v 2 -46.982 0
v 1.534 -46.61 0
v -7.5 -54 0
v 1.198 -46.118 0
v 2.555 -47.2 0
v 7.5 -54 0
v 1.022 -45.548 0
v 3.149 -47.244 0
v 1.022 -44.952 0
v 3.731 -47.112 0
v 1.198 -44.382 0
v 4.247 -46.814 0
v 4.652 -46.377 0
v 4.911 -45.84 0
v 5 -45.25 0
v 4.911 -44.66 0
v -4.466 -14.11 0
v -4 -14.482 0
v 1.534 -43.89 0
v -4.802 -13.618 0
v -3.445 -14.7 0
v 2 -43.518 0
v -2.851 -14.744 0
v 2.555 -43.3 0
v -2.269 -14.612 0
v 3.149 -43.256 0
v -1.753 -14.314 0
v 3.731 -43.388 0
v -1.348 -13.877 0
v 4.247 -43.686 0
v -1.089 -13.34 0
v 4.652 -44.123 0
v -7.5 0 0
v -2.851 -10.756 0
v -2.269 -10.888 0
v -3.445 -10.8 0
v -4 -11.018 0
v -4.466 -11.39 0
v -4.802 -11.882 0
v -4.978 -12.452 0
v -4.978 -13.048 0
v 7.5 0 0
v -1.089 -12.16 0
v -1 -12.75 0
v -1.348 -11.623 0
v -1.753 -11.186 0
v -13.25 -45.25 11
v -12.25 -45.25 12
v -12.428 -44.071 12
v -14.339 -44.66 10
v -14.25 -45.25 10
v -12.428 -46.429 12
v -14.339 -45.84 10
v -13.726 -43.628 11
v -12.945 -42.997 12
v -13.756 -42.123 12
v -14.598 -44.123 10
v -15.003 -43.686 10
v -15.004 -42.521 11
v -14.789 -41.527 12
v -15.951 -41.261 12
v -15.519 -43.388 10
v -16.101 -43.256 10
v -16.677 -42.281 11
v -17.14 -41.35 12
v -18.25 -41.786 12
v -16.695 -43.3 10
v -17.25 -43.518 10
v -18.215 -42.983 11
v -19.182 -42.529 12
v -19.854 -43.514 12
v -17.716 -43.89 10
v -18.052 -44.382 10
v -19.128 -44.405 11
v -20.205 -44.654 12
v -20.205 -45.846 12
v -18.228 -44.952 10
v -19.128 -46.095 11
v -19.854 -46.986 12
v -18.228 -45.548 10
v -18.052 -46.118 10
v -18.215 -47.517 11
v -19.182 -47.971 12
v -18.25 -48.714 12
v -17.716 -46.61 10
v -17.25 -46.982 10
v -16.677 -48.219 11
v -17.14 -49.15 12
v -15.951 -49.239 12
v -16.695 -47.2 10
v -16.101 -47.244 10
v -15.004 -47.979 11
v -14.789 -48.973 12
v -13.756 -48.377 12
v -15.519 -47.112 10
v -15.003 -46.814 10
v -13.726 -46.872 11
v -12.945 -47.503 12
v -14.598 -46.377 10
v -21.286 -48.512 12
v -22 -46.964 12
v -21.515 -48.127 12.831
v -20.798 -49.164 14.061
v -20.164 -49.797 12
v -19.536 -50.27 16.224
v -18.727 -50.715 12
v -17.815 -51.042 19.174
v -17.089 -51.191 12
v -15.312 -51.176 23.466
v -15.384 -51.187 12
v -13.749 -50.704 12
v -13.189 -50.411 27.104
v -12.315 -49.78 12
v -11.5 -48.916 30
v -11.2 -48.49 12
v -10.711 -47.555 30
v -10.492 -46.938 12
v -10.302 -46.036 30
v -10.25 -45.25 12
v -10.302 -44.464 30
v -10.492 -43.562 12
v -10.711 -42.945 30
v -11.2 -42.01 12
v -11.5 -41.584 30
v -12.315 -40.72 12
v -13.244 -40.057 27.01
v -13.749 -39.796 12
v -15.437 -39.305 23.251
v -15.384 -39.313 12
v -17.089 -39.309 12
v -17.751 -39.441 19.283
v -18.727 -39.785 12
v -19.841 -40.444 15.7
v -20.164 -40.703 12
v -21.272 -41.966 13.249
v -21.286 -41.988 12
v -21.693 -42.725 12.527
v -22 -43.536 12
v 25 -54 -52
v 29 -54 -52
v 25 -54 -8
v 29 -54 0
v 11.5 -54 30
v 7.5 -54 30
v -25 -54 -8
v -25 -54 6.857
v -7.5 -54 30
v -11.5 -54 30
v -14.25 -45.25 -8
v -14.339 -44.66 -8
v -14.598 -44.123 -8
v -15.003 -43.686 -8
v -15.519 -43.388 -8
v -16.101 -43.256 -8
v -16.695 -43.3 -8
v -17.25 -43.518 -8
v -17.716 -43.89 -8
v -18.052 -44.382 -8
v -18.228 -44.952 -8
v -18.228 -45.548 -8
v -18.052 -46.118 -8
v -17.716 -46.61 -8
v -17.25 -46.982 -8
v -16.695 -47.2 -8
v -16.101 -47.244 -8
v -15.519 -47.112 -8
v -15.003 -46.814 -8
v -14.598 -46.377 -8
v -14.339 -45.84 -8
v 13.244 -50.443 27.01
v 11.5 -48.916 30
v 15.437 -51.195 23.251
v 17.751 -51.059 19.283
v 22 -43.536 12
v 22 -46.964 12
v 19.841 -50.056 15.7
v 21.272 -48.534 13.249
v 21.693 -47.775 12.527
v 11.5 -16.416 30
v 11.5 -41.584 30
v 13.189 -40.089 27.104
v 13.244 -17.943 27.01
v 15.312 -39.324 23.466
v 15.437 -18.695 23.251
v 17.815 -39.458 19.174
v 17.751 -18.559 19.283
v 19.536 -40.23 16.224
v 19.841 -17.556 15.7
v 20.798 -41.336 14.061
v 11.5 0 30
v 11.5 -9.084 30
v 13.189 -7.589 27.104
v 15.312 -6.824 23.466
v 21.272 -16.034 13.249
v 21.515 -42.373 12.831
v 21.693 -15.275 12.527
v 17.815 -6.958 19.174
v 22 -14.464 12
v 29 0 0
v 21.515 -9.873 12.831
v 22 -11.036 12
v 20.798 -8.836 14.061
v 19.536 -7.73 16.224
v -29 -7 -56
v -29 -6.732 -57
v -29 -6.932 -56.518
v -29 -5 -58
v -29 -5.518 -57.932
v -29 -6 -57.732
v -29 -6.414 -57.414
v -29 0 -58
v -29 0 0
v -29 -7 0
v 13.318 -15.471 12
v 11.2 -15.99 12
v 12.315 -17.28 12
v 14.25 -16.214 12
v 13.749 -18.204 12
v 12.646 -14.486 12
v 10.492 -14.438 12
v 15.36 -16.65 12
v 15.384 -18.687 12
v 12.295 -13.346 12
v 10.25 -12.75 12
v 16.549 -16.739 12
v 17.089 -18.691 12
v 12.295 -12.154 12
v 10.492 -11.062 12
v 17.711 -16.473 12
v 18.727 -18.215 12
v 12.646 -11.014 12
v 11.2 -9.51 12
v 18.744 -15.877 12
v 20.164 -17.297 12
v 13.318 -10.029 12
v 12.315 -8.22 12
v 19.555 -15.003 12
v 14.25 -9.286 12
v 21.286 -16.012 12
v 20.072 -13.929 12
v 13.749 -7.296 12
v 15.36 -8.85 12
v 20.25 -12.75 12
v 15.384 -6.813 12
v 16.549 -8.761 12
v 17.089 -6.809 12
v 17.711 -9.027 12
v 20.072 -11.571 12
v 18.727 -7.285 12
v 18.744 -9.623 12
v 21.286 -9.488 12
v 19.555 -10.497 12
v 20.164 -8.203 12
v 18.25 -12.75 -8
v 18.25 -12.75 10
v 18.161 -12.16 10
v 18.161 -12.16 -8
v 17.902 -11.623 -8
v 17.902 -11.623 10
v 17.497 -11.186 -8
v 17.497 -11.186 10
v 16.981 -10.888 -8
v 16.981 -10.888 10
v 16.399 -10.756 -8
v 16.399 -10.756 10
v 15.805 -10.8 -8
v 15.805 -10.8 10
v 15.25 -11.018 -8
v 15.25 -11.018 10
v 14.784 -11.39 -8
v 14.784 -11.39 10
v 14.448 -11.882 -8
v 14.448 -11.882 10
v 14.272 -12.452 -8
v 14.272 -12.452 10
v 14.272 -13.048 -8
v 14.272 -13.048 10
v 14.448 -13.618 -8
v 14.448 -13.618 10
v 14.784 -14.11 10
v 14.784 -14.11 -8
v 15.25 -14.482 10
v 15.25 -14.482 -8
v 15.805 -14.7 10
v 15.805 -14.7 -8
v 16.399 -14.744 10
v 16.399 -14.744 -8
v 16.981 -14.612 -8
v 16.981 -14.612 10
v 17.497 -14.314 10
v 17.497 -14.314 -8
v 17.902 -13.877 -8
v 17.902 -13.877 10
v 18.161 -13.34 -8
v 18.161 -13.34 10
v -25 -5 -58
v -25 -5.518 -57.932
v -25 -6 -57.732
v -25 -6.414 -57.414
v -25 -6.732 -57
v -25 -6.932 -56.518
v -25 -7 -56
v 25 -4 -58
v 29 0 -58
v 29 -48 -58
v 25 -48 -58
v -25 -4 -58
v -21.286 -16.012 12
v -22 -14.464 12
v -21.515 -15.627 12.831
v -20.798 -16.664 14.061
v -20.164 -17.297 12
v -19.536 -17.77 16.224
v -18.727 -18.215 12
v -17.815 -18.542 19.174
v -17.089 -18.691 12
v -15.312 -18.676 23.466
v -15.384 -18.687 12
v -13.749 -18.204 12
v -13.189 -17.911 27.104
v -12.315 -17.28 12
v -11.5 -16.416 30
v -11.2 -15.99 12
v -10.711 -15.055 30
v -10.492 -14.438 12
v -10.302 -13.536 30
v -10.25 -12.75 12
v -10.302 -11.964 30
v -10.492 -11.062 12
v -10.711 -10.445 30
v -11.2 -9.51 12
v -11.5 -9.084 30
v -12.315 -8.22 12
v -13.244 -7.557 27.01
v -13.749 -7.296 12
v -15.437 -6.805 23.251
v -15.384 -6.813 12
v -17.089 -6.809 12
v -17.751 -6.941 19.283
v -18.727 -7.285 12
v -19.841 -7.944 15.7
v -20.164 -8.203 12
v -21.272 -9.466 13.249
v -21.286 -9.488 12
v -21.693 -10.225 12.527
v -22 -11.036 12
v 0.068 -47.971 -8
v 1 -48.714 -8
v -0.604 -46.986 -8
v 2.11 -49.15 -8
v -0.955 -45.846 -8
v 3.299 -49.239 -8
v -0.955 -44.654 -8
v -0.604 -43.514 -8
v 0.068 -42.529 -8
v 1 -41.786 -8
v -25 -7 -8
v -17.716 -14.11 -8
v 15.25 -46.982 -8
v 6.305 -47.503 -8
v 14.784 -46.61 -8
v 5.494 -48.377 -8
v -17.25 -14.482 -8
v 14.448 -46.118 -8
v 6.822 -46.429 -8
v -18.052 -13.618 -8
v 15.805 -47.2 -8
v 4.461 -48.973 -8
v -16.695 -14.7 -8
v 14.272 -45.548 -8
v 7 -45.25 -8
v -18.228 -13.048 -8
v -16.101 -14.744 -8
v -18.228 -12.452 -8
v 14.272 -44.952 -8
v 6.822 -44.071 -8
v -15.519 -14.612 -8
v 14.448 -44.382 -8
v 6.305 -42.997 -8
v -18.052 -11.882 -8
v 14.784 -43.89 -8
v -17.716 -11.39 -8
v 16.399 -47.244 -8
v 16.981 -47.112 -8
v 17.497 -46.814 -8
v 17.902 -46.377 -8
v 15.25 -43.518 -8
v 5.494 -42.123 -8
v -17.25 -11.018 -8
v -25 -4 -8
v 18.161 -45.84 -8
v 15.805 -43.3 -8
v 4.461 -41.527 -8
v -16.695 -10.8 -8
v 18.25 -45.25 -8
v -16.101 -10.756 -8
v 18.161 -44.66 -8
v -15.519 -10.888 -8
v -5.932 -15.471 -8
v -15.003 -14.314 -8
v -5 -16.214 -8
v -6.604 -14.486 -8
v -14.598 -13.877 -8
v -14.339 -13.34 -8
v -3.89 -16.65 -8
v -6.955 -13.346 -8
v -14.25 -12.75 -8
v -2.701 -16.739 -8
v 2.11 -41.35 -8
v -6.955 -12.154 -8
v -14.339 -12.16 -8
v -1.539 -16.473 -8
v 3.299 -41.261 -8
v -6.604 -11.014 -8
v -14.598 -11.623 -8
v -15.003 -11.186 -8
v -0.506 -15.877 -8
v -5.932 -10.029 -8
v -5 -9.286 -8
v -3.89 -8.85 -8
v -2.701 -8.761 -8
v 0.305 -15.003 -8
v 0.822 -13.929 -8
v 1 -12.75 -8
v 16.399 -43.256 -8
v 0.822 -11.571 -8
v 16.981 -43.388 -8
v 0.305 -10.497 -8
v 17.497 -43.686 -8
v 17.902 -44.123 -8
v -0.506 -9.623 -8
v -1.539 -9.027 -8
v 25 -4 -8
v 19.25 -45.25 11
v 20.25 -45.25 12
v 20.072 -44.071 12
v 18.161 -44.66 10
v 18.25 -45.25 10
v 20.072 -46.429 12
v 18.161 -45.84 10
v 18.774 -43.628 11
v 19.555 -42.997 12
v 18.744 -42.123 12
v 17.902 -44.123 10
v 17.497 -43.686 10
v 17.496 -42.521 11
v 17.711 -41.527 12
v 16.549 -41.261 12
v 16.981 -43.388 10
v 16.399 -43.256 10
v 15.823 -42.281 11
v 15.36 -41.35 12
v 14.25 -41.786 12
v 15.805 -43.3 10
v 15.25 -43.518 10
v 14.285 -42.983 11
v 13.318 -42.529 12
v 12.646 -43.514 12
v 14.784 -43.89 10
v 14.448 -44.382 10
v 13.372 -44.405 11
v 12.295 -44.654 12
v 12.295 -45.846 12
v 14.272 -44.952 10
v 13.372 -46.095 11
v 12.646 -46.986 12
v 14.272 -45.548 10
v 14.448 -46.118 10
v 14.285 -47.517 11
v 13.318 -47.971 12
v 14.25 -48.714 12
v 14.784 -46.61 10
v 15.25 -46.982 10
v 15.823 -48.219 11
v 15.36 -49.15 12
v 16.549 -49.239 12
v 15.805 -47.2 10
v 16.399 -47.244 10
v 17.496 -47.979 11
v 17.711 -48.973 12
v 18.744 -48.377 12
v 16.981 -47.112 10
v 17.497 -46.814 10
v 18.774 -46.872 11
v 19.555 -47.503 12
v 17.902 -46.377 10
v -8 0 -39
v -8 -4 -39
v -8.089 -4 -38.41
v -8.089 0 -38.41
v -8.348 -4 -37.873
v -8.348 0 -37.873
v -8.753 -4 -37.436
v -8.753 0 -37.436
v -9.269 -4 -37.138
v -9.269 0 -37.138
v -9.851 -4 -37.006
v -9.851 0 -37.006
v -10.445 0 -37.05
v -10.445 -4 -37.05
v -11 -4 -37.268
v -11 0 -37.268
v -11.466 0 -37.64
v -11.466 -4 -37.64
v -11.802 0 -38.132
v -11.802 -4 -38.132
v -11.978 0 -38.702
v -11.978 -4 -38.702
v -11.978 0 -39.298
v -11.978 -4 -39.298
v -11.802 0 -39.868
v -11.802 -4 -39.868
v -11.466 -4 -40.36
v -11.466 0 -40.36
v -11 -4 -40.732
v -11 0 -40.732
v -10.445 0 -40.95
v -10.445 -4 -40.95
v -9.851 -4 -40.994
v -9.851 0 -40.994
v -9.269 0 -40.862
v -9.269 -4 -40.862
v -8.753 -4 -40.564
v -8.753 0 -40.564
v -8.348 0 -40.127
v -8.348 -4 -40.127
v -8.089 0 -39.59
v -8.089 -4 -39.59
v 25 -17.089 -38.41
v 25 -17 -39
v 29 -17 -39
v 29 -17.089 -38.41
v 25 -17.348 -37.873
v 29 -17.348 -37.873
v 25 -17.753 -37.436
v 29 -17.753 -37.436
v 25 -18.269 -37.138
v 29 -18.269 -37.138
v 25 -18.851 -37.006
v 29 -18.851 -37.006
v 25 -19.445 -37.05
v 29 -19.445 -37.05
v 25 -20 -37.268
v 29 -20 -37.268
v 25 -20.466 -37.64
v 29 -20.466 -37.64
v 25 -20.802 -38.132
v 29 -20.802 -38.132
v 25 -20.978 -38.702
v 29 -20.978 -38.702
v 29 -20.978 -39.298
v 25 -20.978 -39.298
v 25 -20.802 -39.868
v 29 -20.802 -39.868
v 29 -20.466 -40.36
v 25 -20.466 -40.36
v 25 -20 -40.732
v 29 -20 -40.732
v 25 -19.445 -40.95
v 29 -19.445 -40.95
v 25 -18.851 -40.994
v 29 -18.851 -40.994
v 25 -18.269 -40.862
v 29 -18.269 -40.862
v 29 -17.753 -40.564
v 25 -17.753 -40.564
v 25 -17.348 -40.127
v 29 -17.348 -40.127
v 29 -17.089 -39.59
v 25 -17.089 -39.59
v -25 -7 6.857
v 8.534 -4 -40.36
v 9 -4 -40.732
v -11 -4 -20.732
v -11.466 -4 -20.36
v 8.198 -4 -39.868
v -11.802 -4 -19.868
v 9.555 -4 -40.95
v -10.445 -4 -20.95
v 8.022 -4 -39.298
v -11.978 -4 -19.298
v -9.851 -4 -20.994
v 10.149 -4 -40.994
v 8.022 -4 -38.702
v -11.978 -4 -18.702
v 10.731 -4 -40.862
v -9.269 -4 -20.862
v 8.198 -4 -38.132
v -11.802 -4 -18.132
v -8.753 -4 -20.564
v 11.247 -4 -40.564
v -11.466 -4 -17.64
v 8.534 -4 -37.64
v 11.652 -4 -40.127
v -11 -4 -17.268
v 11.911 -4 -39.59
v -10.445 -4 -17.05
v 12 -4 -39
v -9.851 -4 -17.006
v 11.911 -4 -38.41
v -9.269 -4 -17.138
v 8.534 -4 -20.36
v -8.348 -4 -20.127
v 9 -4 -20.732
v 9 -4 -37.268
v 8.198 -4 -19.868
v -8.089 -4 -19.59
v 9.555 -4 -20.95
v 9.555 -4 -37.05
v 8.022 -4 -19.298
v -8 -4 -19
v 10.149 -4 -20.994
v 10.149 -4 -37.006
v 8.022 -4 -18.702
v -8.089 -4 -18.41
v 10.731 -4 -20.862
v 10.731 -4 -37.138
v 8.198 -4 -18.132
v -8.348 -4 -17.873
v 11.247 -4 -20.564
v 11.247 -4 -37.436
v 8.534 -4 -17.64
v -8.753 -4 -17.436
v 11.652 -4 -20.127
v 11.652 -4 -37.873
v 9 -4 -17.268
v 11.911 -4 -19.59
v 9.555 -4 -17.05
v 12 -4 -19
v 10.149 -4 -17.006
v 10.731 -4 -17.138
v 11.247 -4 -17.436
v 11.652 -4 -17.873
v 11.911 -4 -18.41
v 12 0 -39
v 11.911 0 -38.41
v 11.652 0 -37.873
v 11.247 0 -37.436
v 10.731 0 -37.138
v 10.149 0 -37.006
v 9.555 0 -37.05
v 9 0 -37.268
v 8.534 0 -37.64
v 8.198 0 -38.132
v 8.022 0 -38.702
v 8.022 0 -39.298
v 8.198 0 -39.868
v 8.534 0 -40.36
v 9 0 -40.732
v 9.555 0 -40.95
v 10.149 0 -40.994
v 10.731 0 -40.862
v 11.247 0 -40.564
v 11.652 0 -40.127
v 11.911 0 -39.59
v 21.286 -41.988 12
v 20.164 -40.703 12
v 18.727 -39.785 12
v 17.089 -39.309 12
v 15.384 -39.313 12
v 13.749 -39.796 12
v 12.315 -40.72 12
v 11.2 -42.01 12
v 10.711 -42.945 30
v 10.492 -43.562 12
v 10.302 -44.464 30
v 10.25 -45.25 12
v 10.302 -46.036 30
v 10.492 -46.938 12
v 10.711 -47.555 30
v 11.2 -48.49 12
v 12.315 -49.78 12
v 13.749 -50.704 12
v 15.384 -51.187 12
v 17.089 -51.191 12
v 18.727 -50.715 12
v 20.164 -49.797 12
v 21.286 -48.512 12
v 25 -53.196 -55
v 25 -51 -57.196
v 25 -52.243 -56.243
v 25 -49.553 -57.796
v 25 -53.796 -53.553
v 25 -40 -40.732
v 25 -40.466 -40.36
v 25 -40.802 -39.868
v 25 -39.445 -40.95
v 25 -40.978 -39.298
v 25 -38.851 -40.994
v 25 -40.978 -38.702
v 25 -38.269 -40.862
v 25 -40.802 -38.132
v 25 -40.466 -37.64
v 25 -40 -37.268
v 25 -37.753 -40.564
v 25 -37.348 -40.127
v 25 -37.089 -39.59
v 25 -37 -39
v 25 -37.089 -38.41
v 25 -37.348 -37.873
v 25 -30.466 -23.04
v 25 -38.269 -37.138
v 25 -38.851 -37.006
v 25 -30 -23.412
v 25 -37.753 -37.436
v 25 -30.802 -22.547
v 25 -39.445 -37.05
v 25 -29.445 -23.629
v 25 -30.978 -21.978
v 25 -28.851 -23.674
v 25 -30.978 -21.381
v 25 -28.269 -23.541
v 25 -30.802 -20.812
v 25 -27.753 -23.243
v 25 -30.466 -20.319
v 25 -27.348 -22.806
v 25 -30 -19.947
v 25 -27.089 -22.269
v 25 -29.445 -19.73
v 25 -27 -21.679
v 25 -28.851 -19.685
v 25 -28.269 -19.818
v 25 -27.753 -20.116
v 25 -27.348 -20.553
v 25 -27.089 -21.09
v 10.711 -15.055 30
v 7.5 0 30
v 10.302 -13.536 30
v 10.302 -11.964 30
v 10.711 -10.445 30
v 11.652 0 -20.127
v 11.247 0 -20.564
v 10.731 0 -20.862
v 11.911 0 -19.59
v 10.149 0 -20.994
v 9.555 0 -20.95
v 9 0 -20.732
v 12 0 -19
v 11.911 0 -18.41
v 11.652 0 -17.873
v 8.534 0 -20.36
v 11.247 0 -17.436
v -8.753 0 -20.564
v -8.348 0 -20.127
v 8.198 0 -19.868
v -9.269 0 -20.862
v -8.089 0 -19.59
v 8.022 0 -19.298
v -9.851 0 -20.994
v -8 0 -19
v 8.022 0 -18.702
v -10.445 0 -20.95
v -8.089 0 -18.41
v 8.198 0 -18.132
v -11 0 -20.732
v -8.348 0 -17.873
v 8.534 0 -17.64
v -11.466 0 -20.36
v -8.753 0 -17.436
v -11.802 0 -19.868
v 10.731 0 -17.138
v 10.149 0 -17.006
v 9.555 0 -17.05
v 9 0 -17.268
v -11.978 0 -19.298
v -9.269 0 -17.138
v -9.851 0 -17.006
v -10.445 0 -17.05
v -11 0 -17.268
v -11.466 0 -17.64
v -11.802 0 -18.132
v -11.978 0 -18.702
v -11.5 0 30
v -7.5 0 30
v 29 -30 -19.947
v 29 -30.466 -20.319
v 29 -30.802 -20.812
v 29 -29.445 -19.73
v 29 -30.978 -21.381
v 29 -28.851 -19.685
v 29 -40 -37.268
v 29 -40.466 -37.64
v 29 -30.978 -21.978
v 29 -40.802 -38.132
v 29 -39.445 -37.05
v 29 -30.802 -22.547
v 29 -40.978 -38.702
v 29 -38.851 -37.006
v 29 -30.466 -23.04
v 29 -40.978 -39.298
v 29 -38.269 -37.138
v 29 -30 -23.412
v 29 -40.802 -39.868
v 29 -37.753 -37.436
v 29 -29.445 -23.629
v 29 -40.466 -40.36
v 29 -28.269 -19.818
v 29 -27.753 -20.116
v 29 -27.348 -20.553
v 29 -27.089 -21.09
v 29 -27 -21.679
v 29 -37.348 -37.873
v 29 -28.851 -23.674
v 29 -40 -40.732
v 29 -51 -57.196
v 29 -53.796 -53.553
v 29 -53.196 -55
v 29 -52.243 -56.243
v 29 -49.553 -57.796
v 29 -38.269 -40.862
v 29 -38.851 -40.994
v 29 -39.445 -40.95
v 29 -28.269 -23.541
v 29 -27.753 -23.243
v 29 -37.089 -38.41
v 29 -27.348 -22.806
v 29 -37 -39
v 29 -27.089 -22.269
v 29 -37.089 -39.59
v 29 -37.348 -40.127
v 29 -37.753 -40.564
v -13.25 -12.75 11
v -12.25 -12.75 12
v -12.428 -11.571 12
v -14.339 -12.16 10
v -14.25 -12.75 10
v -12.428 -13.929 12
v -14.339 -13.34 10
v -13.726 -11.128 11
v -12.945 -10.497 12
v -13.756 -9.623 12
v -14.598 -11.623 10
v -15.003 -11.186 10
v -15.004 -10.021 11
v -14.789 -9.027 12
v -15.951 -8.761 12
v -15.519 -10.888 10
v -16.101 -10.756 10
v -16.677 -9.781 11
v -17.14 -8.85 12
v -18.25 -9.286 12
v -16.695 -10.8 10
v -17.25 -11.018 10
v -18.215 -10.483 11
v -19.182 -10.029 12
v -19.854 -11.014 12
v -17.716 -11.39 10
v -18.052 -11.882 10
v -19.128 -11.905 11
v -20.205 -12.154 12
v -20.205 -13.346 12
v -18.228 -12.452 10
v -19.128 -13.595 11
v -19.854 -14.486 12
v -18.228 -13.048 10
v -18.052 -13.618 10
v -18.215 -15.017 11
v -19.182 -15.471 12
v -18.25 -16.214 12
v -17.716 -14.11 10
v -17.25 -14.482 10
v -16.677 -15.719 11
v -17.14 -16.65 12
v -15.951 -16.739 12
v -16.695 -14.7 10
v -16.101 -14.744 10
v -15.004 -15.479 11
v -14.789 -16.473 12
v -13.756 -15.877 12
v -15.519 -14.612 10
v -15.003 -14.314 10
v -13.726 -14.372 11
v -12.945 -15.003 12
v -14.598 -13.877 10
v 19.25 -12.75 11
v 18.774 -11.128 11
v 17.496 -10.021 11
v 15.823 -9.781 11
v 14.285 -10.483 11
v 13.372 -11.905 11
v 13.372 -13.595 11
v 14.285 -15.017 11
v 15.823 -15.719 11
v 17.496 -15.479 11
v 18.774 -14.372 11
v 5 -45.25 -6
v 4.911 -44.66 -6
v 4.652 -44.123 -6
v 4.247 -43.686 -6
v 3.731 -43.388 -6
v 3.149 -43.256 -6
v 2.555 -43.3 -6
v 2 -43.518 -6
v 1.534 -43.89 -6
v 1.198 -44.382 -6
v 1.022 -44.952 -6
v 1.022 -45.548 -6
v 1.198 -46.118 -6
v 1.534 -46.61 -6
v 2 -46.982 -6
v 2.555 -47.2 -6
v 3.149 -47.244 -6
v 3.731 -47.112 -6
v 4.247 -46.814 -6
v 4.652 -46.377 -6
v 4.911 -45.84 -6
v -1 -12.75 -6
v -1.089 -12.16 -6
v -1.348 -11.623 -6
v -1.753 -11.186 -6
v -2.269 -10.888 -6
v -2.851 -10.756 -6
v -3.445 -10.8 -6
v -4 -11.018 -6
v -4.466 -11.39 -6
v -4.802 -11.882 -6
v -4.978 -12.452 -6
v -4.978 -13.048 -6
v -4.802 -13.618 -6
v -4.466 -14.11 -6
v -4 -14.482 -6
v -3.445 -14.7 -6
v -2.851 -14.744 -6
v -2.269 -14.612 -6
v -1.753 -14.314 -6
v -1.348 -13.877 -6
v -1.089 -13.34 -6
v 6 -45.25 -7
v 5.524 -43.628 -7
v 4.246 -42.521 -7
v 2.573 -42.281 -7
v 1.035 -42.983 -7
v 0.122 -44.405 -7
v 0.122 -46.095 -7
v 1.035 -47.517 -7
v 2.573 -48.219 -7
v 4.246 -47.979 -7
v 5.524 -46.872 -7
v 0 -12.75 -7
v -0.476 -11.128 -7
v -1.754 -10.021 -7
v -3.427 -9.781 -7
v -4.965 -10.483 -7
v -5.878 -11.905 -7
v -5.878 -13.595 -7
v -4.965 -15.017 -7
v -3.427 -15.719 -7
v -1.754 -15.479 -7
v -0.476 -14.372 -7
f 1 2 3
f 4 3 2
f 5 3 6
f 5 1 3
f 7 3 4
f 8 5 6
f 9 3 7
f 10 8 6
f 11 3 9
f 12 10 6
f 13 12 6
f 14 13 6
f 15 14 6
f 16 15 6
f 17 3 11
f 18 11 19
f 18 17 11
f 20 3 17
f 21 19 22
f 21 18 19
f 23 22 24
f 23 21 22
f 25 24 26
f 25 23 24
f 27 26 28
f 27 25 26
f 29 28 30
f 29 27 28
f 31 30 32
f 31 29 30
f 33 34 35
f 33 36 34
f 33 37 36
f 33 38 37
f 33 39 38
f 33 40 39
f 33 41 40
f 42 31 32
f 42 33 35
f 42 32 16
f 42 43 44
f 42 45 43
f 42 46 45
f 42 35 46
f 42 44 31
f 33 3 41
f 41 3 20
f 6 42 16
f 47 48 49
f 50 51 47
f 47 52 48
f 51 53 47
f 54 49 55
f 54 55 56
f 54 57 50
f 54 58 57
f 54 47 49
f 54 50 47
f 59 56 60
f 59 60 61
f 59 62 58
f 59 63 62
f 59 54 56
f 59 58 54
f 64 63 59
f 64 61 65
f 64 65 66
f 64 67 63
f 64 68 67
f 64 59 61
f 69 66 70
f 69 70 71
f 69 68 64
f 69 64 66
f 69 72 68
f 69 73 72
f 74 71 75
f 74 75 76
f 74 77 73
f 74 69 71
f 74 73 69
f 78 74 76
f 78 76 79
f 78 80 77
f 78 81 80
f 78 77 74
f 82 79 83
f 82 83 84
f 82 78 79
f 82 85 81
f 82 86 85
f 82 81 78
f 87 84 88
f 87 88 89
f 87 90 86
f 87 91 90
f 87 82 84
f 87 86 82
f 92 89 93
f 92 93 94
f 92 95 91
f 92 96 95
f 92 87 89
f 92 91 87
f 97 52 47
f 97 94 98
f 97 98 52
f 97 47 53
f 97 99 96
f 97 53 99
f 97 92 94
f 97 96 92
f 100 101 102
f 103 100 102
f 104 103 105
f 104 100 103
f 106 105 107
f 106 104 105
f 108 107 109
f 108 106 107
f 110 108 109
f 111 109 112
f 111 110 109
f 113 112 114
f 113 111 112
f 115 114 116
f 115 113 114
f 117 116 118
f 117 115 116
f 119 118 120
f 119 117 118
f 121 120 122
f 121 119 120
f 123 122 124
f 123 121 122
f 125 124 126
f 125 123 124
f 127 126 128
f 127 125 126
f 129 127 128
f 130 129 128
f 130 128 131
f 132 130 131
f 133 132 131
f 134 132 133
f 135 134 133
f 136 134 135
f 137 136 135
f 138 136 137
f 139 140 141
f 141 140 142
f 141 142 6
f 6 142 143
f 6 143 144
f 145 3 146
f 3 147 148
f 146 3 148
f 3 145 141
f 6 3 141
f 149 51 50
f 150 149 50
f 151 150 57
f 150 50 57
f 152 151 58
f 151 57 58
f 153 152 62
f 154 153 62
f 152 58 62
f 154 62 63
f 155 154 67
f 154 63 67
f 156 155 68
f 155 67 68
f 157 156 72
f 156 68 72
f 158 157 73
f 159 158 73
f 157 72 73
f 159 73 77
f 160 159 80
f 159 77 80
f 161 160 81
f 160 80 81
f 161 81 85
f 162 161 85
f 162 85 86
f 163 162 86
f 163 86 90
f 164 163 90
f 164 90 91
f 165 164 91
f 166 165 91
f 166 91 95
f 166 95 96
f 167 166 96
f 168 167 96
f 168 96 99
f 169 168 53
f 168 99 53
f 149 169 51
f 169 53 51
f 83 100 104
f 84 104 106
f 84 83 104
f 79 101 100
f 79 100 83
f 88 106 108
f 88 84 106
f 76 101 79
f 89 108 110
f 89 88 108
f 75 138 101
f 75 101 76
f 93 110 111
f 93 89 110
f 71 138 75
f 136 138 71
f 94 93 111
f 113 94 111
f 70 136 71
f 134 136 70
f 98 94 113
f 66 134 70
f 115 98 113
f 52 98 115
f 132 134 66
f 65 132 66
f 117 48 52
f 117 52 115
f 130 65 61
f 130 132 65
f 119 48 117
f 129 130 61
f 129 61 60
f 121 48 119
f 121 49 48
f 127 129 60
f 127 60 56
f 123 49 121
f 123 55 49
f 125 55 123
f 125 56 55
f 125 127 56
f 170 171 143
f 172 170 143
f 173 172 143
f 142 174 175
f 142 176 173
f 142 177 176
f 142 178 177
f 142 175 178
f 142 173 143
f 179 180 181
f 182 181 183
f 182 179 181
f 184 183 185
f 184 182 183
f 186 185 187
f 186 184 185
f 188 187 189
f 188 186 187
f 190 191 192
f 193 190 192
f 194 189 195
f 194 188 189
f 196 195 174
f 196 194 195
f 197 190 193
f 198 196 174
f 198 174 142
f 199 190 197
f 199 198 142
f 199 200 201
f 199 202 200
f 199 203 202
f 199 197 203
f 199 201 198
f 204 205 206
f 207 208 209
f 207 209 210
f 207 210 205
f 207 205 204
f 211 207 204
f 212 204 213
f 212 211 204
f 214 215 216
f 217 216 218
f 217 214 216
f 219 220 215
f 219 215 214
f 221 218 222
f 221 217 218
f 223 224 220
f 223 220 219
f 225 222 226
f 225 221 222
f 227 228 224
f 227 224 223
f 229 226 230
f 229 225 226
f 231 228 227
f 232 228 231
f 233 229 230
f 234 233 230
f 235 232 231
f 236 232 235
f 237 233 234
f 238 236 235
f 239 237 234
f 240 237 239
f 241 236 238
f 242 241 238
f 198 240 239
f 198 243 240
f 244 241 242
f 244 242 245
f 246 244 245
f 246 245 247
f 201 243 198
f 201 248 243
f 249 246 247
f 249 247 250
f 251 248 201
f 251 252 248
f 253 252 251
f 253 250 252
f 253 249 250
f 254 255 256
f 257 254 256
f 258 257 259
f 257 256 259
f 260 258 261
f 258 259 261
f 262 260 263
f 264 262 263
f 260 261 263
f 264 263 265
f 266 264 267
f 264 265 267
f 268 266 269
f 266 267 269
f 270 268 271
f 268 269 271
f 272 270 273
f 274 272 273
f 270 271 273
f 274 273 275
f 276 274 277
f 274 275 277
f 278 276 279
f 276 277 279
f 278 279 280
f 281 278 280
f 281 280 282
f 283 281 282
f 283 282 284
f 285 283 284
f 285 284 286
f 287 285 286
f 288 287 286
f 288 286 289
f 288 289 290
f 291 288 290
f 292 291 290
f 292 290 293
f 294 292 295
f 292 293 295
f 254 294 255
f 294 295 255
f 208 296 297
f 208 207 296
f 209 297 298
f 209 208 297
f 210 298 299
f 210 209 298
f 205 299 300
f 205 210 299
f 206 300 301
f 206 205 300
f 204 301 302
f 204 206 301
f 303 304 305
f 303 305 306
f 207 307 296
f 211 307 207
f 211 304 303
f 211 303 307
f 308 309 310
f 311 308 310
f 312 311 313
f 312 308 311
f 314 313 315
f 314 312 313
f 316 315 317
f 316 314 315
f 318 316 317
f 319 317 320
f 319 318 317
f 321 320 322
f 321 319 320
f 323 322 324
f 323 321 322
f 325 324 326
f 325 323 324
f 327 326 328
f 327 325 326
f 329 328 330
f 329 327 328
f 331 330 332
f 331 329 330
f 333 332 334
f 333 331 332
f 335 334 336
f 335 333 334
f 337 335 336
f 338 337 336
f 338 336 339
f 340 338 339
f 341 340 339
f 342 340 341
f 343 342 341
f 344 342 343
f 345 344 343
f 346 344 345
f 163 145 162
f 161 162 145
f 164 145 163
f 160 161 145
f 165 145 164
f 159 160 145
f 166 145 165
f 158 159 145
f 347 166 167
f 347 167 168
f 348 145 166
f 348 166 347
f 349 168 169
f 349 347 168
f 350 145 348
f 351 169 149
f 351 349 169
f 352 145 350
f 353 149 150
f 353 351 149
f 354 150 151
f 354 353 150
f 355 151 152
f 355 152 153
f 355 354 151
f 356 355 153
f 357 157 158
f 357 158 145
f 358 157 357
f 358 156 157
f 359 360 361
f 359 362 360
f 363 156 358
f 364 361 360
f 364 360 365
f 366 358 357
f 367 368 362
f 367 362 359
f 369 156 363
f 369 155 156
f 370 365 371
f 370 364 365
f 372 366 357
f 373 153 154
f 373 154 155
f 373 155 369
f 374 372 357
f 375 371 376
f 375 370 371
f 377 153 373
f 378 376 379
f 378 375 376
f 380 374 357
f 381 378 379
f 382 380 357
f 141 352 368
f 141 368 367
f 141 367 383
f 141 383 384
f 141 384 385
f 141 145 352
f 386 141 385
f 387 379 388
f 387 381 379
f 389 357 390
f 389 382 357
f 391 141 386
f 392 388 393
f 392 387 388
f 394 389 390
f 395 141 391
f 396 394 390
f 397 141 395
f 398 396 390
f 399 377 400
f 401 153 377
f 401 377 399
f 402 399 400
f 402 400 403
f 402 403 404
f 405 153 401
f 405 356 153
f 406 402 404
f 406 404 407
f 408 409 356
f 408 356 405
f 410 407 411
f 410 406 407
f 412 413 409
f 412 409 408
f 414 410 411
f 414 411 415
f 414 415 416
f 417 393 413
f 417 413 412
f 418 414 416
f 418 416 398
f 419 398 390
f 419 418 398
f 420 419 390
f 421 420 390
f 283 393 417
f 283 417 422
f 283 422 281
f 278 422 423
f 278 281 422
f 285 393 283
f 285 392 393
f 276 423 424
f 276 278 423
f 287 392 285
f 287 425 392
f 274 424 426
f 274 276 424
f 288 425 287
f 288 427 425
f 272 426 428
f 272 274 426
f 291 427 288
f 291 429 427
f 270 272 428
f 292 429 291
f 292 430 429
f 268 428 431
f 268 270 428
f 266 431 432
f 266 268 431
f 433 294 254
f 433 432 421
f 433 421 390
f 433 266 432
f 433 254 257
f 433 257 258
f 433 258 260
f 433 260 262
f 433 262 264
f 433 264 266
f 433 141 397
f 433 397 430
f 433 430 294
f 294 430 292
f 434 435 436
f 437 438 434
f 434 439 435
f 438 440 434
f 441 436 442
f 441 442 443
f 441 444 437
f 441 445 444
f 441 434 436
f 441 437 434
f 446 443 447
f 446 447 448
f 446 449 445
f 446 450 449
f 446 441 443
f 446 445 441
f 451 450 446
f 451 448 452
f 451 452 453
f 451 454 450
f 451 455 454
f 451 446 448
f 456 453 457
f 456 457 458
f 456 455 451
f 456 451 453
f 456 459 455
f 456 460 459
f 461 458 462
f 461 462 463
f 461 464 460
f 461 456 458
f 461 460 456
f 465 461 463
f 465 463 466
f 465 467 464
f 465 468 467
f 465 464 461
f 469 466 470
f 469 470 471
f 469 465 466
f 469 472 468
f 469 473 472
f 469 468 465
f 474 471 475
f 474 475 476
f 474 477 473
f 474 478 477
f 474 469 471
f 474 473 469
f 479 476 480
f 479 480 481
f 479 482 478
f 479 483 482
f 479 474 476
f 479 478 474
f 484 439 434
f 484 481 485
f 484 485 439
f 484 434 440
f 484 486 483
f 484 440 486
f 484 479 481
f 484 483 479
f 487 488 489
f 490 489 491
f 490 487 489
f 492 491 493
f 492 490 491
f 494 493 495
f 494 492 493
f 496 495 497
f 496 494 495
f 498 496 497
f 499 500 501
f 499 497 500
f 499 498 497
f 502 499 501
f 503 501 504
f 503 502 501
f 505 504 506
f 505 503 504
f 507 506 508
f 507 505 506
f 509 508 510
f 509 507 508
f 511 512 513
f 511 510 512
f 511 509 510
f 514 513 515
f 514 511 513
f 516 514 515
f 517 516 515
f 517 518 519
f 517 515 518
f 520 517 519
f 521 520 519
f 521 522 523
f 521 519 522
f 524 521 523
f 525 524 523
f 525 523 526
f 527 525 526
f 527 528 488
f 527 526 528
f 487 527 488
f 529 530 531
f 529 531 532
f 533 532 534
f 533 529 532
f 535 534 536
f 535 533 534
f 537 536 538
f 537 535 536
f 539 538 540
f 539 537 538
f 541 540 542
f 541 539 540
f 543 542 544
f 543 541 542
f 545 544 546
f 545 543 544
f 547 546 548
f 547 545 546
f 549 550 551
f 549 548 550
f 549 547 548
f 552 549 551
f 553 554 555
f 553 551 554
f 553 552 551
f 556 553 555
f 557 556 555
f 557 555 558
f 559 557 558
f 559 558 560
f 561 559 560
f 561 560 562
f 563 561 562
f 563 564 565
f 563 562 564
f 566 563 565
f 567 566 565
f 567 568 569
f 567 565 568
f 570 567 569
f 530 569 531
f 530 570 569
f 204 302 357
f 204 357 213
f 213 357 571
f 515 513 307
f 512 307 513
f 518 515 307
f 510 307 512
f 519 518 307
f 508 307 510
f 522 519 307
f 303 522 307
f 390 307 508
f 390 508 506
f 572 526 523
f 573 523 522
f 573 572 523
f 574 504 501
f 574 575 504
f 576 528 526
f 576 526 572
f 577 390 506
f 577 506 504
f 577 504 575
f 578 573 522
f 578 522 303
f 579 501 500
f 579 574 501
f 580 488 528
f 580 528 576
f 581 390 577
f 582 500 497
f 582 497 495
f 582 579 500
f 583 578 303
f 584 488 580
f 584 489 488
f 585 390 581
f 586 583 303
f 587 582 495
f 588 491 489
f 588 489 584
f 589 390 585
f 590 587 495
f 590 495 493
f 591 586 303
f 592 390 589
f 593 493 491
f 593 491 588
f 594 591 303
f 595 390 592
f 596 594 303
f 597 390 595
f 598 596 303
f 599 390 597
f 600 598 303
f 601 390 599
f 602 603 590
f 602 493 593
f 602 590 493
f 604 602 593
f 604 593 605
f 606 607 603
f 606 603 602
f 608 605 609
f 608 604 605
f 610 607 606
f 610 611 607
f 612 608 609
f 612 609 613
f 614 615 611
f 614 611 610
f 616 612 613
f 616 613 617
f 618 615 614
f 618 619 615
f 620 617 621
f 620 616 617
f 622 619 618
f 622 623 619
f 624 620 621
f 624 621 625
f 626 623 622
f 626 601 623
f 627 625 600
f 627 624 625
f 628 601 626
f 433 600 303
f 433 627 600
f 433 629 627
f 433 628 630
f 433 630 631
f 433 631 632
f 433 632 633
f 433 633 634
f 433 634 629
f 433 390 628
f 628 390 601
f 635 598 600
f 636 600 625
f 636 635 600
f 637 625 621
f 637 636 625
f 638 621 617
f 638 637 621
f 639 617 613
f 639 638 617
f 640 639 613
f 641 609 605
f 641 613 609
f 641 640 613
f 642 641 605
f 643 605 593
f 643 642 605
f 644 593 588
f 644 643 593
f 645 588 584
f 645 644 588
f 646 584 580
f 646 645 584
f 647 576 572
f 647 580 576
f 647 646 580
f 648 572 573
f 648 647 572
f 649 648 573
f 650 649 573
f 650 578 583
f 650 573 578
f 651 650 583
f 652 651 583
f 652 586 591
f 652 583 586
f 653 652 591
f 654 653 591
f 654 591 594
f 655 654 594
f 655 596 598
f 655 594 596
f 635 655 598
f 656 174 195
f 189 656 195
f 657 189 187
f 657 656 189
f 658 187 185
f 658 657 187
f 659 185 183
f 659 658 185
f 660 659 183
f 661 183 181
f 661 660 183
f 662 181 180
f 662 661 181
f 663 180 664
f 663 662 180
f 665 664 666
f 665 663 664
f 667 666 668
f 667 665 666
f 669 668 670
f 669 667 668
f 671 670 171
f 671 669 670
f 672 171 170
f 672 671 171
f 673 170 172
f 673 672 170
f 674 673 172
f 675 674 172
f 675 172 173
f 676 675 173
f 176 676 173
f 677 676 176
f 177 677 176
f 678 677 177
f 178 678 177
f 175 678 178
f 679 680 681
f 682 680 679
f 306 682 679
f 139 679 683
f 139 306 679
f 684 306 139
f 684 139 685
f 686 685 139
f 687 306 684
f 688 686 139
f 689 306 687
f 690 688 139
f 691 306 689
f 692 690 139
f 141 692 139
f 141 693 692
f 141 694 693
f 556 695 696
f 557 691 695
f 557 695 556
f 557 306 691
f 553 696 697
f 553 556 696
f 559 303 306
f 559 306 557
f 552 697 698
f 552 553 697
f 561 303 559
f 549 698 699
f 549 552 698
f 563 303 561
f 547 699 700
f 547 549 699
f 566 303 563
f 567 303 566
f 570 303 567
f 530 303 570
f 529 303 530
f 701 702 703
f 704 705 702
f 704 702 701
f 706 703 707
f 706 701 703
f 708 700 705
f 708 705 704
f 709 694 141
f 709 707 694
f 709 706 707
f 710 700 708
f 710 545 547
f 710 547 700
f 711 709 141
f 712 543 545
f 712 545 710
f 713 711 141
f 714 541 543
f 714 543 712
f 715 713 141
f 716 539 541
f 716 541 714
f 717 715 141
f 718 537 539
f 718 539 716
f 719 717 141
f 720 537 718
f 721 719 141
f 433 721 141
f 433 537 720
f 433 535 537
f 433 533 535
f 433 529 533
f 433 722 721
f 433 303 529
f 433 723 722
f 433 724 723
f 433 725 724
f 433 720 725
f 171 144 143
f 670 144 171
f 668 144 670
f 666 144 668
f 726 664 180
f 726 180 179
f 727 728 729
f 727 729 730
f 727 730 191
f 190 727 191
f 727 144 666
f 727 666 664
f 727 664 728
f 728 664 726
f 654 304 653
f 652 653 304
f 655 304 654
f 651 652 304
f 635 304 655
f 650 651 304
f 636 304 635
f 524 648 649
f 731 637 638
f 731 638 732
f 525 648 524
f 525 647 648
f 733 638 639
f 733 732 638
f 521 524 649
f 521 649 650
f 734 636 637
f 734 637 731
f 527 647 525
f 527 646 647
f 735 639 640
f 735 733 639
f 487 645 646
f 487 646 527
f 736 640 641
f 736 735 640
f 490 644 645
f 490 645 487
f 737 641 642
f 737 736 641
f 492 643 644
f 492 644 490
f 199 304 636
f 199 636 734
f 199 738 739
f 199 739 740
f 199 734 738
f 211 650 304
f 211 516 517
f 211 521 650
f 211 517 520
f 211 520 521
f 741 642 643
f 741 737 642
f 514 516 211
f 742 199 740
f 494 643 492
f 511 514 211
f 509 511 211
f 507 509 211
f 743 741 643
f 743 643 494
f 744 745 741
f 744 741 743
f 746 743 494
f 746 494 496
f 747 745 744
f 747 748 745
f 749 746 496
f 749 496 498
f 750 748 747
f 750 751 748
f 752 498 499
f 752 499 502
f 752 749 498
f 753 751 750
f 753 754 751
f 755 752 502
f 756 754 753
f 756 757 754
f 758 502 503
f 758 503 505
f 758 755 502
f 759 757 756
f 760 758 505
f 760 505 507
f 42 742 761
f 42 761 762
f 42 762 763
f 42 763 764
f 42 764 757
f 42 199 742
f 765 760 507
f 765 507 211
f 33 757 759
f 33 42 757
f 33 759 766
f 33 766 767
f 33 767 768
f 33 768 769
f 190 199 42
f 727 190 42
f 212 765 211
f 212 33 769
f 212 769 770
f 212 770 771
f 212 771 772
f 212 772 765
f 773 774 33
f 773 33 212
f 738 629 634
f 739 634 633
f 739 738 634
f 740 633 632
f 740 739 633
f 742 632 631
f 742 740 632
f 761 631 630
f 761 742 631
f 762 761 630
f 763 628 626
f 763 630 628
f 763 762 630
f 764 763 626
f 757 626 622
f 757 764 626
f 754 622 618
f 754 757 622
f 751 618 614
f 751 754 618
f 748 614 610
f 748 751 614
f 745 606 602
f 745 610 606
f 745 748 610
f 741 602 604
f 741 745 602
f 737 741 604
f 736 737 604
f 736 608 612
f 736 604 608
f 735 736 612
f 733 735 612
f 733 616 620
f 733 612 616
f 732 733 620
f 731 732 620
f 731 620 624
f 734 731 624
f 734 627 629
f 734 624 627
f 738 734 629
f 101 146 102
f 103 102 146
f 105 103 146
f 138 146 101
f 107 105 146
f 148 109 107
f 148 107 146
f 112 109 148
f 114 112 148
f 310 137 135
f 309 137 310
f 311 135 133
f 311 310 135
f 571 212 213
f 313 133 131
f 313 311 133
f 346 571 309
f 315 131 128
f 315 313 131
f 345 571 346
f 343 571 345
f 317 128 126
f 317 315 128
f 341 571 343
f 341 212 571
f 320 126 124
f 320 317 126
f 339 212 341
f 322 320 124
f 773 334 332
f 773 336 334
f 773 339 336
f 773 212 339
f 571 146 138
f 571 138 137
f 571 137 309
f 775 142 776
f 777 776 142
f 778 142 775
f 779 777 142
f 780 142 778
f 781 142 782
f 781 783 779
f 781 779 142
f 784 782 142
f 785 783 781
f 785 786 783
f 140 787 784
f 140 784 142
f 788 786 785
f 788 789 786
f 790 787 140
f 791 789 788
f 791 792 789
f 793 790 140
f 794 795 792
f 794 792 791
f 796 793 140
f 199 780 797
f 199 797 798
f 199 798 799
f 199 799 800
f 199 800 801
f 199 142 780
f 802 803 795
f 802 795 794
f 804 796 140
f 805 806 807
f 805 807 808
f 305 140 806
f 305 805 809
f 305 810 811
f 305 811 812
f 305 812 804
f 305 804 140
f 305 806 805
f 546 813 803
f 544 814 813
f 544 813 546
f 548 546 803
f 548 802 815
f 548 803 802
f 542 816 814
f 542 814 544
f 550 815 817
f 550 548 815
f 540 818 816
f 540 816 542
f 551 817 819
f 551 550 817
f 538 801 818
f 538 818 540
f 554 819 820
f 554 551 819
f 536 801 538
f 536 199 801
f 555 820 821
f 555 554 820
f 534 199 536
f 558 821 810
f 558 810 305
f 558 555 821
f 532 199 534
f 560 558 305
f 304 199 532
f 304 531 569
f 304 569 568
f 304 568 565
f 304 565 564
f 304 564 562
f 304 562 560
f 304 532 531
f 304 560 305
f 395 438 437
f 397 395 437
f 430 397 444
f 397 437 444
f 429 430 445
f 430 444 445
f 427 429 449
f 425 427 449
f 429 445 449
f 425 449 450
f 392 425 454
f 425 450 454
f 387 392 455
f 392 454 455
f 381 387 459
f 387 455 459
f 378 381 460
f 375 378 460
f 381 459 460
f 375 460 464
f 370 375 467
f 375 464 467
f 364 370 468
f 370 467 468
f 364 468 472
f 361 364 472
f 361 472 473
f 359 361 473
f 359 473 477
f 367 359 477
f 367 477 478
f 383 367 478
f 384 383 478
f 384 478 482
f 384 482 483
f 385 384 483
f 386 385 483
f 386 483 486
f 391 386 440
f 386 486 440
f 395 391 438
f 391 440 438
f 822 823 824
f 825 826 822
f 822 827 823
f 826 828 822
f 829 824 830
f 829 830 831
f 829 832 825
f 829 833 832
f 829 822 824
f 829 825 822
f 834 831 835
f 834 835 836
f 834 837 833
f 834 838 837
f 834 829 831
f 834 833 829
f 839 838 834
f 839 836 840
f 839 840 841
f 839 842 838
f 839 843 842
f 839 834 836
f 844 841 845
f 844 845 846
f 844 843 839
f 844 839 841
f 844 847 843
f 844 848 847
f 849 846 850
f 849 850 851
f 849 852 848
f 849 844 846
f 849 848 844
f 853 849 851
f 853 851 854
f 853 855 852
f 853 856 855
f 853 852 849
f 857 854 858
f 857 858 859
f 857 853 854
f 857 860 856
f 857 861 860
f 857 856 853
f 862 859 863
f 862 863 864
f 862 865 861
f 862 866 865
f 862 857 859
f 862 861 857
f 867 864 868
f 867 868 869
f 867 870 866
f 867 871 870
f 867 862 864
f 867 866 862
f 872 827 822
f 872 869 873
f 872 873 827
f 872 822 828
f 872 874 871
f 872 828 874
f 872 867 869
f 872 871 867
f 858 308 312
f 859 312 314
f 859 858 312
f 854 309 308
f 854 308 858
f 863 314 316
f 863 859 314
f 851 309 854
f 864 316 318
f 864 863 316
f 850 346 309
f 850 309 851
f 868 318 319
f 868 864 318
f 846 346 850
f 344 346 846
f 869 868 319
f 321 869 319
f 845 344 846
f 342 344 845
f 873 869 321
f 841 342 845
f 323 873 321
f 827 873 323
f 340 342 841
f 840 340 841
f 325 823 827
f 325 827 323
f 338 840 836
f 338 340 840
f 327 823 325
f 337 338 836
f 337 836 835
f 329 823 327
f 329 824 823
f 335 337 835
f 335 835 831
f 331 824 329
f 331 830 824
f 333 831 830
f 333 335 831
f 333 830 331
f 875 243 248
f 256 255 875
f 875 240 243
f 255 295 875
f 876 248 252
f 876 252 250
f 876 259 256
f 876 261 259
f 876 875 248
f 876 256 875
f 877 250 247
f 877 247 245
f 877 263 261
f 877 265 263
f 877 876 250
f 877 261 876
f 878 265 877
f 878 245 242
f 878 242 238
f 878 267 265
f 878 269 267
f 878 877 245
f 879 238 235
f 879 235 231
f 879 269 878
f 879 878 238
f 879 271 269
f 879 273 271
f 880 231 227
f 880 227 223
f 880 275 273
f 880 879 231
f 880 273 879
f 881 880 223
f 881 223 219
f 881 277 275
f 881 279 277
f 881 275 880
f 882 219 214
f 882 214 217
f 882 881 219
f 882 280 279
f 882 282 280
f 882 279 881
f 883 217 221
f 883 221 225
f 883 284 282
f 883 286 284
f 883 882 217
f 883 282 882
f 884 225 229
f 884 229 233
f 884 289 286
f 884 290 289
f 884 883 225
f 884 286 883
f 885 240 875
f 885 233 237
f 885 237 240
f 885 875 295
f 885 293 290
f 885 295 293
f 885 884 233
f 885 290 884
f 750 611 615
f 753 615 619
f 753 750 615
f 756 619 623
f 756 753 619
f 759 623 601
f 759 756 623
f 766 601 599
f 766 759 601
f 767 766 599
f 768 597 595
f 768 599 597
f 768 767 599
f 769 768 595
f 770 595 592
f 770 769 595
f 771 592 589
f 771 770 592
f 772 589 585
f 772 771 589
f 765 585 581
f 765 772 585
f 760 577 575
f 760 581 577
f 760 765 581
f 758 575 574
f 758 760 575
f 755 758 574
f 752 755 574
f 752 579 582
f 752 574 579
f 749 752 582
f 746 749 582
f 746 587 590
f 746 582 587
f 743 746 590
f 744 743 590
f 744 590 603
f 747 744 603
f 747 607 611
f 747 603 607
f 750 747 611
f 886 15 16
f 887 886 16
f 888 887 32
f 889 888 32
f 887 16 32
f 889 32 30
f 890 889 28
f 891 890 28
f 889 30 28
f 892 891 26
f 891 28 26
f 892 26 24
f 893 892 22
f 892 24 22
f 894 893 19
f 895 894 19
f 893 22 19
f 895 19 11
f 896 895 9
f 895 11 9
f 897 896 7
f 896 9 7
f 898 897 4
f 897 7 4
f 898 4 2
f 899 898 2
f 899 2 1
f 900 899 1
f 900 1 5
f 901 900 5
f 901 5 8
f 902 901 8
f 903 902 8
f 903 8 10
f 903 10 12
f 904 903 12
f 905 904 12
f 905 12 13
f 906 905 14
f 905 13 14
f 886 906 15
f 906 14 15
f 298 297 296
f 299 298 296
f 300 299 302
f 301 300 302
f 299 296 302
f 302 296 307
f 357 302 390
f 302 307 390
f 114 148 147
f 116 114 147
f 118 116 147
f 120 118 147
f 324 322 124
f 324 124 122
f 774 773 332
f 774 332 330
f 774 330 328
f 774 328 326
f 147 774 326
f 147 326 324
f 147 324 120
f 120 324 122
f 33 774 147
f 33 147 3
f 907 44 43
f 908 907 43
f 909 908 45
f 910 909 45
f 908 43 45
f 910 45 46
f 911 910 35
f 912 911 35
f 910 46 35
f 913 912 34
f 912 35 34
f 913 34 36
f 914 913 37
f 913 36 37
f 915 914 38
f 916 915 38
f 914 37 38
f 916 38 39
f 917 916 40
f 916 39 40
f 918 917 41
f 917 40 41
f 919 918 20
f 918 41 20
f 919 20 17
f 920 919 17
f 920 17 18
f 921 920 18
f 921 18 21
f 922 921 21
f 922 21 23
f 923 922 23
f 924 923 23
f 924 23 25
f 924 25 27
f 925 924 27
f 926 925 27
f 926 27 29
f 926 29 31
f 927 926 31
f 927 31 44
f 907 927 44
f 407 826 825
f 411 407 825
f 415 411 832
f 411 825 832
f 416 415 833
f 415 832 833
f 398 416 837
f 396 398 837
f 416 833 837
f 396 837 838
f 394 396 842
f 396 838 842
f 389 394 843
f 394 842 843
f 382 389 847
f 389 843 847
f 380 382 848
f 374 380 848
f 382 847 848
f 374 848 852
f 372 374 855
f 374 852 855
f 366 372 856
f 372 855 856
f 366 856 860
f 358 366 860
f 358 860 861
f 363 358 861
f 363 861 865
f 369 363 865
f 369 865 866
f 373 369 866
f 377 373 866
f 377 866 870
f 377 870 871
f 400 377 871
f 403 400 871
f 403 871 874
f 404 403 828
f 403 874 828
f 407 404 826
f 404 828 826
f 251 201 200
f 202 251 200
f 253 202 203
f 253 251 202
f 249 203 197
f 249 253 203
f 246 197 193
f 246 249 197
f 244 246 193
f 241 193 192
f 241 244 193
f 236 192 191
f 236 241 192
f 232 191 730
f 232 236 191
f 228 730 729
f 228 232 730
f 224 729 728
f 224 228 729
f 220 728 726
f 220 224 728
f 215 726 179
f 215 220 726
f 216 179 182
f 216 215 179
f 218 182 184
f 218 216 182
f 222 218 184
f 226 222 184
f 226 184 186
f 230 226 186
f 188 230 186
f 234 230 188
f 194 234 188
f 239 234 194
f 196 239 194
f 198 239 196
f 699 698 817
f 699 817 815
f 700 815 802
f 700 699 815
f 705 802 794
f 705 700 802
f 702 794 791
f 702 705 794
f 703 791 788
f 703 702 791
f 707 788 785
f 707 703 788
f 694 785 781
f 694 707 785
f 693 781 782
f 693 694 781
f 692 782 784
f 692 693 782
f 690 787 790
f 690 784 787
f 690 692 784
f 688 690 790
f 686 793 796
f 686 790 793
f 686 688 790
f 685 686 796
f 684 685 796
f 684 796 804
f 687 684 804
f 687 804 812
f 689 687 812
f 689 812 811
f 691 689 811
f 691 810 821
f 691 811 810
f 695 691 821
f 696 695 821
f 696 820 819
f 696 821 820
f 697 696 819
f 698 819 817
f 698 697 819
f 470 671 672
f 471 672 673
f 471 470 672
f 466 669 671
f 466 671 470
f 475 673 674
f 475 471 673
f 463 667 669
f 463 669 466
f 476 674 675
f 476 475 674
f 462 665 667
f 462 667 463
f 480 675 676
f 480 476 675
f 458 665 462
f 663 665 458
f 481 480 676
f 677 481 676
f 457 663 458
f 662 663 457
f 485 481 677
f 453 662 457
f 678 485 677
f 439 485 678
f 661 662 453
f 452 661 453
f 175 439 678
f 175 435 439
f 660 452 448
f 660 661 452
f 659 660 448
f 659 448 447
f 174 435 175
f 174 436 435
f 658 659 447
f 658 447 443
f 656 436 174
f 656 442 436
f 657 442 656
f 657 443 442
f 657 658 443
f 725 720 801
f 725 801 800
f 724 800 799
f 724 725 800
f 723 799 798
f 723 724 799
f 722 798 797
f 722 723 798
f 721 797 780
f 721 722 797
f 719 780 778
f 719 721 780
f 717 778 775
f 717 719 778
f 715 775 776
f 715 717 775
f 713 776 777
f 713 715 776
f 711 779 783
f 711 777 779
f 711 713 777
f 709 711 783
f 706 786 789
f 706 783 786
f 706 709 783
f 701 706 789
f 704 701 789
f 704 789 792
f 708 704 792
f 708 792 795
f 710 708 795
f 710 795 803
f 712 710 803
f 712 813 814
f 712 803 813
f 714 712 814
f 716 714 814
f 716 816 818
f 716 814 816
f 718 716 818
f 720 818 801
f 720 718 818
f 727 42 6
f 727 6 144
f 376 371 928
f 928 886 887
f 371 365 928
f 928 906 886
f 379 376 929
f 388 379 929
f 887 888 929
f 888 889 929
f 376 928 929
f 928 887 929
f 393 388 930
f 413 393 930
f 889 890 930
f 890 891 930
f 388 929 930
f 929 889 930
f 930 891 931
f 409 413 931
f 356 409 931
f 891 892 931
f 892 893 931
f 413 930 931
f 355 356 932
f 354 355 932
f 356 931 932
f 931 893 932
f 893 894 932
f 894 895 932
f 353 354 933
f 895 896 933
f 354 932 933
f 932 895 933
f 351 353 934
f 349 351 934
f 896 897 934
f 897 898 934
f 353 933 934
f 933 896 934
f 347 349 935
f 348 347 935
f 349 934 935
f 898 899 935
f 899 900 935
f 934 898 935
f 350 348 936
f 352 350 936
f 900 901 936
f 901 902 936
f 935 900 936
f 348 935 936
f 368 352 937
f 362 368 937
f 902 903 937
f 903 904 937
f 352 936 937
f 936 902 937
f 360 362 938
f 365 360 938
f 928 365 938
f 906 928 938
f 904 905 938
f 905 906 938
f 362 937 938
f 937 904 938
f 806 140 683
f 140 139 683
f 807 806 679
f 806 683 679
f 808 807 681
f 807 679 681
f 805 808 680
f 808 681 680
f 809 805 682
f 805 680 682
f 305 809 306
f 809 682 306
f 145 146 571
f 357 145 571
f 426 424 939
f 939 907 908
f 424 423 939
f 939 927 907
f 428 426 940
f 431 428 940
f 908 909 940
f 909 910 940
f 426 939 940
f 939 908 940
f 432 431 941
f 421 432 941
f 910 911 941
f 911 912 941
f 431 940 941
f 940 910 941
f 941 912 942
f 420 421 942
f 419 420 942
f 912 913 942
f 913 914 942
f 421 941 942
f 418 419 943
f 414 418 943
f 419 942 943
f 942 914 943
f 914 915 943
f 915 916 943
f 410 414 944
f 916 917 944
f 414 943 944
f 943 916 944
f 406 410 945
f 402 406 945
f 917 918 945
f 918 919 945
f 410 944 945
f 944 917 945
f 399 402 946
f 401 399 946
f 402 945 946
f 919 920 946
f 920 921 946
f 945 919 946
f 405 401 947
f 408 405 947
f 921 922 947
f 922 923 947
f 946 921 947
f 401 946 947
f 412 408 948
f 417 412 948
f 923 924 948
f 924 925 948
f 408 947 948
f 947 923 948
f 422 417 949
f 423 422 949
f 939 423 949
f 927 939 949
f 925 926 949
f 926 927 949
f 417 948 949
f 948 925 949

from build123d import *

# Parameters (mm, degrees)
PAD006_DEPTH    = 54
SKETCH035_W     = 50
SKETCH035_H     = 50
POCKET015_DEPTH = 50
SKETCH036_W     = 47
SKETCH036_H     = 50
POCKET016_DEPTH = 50
FILLET008_R     = 6
FILLET009_R     = 2
SKETCH037_W     = 4
SKETCH037_H     = 47
POCKET017_DEPTH = 25
SKETCH038_R     = 2
POCKET018_DEPTH = 50
CHAMFER008_SIZE = 2
SKETCH039_R     = 6
POCKET019_DEPTH = 50
CHAMFER009_SIZE = 2
SKETCH040_R     = 2
POCKET020_DEPTH = 50
SKETCH041_R     = 2
POCKET021_DEPTH = 10


with BuildPart() as part:
    # Sketch034 → Pad006 (new body)
    with BuildSketch(Plane.XZ):
        Polygon((-7.5, 0), (7.5, 0), (7.5, 30), (11.5, 30), (29, 0), (29, -58), (-29, -58), (-29, 0), (-11.5, 30), (-7.5, 30), align=None)
    extrude(amount=PAD006_DEPTH)

    # Sketch035 → Pocket015 (cut)
    with BuildSketch(Plane.XZ.offset(4)):
        with Locations((0, -33)):
            Rectangle(SKETCH035_W, SKETCH035_H)
    extrude(amount=POCKET015_DEPTH, mode=Mode.SUBTRACT)

    # Sketch036 → Pocket016 (cut)
    with BuildSketch(Plane.YZ):
        with Locations((-30.5, -33)):
            Rectangle(SKETCH036_W, SKETCH036_H)
    extrude(amount=-POCKET016_DEPTH, mode=Mode.SUBTRACT)

    # Fillet008
    fillet008_edges = [part.edges().sort_by_distance(p)[0] for p in [
        (27, -54, -58),
    ]]
    fillet(fillet008_edges, radius=FILLET008_R)

    # Fillet009
    fillet009_edges = [part.edges().sort_by_distance(p)[0] for p in [
        (-27, -7, -58),
    ]]
    fillet(fillet009_edges, radius=FILLET009_R)

    # Sketch037 → Pocket017 (cut, symmetric)
    with BuildSketch(Plane.XY):
        with Locations((-27, -30.5)):
            Rectangle(SKETCH037_W, SKETCH037_H)
    extrude(amount=POCKET017_DEPTH, both=True, mode=Mode.SUBTRACT)

    # Sketch038 → Pocket018 (cut, symmetric)
    with BuildSketch(Plane.XY):
        with Locations((-16.25, -12.75)):
            Circle(SKETCH038_R)
        with Locations((-16.25, -45.25)):
            Circle(SKETCH038_R)
        with Locations((16.25, -45.25)):
            Circle(SKETCH038_R)
        with Locations((16.25, -12.75)):
            Circle(SKETCH038_R)
        with Locations((-3, -12.75)):
            Circle(SKETCH038_R)
        with Locations((3, -45.25)):
            Circle(SKETCH038_R)
    extrude(amount=POCKET018_DEPTH, both=True, mode=Mode.SUBTRACT)

    # Chamfer008
    chamfer008_edges = [part.edges().sort_by_distance(p)[0] for p in [
        (1, -45.25, -8),
        (-5, -12.75, -8),
    ]]
    chamfer(chamfer008_edges, length=CHAMFER008_SIZE)

    # Sketch039 → Pocket019 (cut)
    with BuildSketch(Plane.XY.offset(12)):
        with Locations((-16.25, -12.75)):
            Circle(SKETCH039_R)
        with Locations((-16.25, -45.25)):
            Circle(SKETCH039_R)
        with Locations((16.25, -45.25)):
            Circle(SKETCH039_R)
        with Locations((16.25, -12.75)):
            Circle(SKETCH039_R)
    extrude(amount=POCKET019_DEPTH, mode=Mode.SUBTRACT)

    # Chamfer009
    chamfer009_edges = [part.edges().sort_by_distance(p)[0] for p in [
        (-18.25, -45.25, 12),
        (-18.25, -12.75, 12),
        (14.25, -45.25, 12),
        (14.25, -12.75, 12),
    ]]
    chamfer(chamfer009_edges, length=CHAMFER009_SIZE)

    # Sketch040 → Pocket020 (cut)
    with BuildSketch(Plane.YZ):
        with Locations((-29, -21.679492)):
            Circle(SKETCH040_R)
        with Locations((-39, -39)):
            Circle(SKETCH040_R)
        with Locations((-19, -39)):
            Circle(SKETCH040_R)
    extrude(amount=POCKET020_DEPTH, mode=Mode.SUBTRACT)

    # Sketch041 → Pocket021 (cut)
    with BuildSketch(Plane.XZ):
        with Locations((-10, -19)):
            Circle(SKETCH041_R)
        with Locations((10, -19)):
            Circle(SKETCH041_R)
        with Locations((-10, -39)):
            Circle(SKETCH041_R)
        with Locations((10, -39)):
            Circle(SKETCH041_R)
    extrude(amount=POCKET021_DEPTH, mode=Mode.SUBTRACT)


solid = part.part
